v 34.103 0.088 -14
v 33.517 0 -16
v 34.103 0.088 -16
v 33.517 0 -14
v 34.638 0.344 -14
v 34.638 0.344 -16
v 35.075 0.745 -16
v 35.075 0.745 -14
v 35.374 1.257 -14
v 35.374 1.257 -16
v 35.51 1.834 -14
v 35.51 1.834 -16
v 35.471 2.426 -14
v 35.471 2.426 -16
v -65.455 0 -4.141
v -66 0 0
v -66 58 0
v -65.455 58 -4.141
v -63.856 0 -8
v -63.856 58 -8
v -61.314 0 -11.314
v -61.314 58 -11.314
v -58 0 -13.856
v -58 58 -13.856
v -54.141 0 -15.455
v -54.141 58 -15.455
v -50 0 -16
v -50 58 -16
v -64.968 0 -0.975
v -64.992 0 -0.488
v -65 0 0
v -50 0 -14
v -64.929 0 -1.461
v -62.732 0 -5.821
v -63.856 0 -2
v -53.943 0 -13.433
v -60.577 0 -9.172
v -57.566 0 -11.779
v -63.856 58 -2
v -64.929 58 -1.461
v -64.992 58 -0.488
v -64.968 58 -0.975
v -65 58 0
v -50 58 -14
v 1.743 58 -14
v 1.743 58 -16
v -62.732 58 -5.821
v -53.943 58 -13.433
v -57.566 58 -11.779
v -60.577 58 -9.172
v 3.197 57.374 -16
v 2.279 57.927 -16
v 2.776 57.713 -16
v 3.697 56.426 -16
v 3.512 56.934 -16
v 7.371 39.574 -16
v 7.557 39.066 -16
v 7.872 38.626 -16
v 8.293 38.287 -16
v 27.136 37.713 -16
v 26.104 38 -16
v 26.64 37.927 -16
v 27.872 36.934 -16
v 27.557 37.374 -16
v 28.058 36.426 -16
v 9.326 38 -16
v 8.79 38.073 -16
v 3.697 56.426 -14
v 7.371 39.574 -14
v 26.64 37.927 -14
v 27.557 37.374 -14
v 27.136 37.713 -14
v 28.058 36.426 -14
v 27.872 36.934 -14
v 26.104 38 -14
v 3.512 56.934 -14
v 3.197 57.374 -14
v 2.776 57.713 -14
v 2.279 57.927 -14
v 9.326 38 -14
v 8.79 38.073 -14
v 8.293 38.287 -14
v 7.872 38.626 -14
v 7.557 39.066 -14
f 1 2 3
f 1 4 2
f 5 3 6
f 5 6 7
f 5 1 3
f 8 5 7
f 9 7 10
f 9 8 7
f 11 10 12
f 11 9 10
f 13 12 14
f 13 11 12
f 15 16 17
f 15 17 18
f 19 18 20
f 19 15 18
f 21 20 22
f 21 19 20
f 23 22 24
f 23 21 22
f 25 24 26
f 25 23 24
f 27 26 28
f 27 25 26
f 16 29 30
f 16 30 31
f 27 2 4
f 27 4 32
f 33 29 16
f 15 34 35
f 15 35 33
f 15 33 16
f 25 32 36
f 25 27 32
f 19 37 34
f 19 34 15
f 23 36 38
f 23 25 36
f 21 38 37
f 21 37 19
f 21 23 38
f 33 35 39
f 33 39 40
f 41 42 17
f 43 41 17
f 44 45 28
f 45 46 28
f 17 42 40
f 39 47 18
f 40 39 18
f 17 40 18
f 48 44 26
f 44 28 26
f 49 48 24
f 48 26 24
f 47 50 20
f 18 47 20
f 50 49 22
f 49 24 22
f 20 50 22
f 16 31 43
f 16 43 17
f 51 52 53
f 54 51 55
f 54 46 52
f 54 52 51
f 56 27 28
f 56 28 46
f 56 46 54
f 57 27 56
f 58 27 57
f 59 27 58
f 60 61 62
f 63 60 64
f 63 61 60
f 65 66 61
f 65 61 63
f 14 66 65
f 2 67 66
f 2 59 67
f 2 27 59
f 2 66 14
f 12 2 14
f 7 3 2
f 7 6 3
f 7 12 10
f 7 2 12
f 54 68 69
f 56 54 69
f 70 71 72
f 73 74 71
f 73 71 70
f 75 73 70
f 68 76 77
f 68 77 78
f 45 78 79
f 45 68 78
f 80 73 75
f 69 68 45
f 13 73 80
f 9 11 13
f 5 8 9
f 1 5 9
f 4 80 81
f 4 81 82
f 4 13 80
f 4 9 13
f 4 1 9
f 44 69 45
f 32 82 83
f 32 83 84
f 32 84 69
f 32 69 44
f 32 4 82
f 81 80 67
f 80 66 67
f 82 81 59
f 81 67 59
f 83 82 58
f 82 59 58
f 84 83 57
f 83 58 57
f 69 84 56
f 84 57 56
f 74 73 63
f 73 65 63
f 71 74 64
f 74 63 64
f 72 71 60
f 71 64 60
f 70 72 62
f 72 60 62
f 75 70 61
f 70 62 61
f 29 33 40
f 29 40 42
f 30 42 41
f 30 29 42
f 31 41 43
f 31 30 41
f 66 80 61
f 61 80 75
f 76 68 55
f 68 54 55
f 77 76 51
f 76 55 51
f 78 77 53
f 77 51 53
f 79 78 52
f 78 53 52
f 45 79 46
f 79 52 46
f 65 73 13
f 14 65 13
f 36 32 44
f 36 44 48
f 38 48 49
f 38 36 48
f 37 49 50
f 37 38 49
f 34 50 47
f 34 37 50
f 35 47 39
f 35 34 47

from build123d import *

# Parameters (mm, degrees)
BOSS_EXTRUDE1_DEPTH = 58
CUT_EXTRUDE2_DEPTH  = 2
FILLET1_R           = 2


with BuildPart() as part:
    # Sketch1 → Boss-Extrude1 (new body)
    with BuildSketch(Plane(origin=(0, 0, 0), x_dir=(1, 0, 0), z_dir=(0, 1, 0))):
        with BuildLine():
            Line((-50, 16), (36, 16))
            Line((36, 16), (36, 14))
            Line((36, 14), (-50, 14))
            ThreePointArc((-50, 14), (-59.16515139, 10.583005244), (-63.856406461, 2))
            Line((-63.856406461, 2), (-64.928657629, 1.461225992))
            ThreePointArc((-64.928657629, 1.461225992), (-64.982153791, 0.731483276), (-65, 0))
            Line((-65, 0), (-66, 0))
            ThreePointArc((-66, 0), (-61.313708499, 11.313708499), (-50, 16))
        make_face()
    extrude(amount=BOSS_EXTRUDE1_DEPTH)

    # Sketch2 → Cut-Extrude2 (cut)
    with BuildSketch(Plane.XY.offset(-14)):
        Polygon((36, 58), (12.87566783, 58), (3.353954895, 58), (7.714660104, 38), (27.714660104, 38), (36, 0), align=None)
    extrude(amount=-CUT_EXTRUDE2_DEPTH, mode=Mode.SUBTRACT)

    # Fillet1
    fillet1_edges = [part.edges().sort_by_distance(p)[0] for p in [
        (36, 0, -15),
        (7.714660104, 38, -15),
        (3.353954895, 58, -15),
        (27.714660104, 38, -15),
    ]]
    fillet(fillet1_edges, radius=FILLET1_R)


solid = part.part
